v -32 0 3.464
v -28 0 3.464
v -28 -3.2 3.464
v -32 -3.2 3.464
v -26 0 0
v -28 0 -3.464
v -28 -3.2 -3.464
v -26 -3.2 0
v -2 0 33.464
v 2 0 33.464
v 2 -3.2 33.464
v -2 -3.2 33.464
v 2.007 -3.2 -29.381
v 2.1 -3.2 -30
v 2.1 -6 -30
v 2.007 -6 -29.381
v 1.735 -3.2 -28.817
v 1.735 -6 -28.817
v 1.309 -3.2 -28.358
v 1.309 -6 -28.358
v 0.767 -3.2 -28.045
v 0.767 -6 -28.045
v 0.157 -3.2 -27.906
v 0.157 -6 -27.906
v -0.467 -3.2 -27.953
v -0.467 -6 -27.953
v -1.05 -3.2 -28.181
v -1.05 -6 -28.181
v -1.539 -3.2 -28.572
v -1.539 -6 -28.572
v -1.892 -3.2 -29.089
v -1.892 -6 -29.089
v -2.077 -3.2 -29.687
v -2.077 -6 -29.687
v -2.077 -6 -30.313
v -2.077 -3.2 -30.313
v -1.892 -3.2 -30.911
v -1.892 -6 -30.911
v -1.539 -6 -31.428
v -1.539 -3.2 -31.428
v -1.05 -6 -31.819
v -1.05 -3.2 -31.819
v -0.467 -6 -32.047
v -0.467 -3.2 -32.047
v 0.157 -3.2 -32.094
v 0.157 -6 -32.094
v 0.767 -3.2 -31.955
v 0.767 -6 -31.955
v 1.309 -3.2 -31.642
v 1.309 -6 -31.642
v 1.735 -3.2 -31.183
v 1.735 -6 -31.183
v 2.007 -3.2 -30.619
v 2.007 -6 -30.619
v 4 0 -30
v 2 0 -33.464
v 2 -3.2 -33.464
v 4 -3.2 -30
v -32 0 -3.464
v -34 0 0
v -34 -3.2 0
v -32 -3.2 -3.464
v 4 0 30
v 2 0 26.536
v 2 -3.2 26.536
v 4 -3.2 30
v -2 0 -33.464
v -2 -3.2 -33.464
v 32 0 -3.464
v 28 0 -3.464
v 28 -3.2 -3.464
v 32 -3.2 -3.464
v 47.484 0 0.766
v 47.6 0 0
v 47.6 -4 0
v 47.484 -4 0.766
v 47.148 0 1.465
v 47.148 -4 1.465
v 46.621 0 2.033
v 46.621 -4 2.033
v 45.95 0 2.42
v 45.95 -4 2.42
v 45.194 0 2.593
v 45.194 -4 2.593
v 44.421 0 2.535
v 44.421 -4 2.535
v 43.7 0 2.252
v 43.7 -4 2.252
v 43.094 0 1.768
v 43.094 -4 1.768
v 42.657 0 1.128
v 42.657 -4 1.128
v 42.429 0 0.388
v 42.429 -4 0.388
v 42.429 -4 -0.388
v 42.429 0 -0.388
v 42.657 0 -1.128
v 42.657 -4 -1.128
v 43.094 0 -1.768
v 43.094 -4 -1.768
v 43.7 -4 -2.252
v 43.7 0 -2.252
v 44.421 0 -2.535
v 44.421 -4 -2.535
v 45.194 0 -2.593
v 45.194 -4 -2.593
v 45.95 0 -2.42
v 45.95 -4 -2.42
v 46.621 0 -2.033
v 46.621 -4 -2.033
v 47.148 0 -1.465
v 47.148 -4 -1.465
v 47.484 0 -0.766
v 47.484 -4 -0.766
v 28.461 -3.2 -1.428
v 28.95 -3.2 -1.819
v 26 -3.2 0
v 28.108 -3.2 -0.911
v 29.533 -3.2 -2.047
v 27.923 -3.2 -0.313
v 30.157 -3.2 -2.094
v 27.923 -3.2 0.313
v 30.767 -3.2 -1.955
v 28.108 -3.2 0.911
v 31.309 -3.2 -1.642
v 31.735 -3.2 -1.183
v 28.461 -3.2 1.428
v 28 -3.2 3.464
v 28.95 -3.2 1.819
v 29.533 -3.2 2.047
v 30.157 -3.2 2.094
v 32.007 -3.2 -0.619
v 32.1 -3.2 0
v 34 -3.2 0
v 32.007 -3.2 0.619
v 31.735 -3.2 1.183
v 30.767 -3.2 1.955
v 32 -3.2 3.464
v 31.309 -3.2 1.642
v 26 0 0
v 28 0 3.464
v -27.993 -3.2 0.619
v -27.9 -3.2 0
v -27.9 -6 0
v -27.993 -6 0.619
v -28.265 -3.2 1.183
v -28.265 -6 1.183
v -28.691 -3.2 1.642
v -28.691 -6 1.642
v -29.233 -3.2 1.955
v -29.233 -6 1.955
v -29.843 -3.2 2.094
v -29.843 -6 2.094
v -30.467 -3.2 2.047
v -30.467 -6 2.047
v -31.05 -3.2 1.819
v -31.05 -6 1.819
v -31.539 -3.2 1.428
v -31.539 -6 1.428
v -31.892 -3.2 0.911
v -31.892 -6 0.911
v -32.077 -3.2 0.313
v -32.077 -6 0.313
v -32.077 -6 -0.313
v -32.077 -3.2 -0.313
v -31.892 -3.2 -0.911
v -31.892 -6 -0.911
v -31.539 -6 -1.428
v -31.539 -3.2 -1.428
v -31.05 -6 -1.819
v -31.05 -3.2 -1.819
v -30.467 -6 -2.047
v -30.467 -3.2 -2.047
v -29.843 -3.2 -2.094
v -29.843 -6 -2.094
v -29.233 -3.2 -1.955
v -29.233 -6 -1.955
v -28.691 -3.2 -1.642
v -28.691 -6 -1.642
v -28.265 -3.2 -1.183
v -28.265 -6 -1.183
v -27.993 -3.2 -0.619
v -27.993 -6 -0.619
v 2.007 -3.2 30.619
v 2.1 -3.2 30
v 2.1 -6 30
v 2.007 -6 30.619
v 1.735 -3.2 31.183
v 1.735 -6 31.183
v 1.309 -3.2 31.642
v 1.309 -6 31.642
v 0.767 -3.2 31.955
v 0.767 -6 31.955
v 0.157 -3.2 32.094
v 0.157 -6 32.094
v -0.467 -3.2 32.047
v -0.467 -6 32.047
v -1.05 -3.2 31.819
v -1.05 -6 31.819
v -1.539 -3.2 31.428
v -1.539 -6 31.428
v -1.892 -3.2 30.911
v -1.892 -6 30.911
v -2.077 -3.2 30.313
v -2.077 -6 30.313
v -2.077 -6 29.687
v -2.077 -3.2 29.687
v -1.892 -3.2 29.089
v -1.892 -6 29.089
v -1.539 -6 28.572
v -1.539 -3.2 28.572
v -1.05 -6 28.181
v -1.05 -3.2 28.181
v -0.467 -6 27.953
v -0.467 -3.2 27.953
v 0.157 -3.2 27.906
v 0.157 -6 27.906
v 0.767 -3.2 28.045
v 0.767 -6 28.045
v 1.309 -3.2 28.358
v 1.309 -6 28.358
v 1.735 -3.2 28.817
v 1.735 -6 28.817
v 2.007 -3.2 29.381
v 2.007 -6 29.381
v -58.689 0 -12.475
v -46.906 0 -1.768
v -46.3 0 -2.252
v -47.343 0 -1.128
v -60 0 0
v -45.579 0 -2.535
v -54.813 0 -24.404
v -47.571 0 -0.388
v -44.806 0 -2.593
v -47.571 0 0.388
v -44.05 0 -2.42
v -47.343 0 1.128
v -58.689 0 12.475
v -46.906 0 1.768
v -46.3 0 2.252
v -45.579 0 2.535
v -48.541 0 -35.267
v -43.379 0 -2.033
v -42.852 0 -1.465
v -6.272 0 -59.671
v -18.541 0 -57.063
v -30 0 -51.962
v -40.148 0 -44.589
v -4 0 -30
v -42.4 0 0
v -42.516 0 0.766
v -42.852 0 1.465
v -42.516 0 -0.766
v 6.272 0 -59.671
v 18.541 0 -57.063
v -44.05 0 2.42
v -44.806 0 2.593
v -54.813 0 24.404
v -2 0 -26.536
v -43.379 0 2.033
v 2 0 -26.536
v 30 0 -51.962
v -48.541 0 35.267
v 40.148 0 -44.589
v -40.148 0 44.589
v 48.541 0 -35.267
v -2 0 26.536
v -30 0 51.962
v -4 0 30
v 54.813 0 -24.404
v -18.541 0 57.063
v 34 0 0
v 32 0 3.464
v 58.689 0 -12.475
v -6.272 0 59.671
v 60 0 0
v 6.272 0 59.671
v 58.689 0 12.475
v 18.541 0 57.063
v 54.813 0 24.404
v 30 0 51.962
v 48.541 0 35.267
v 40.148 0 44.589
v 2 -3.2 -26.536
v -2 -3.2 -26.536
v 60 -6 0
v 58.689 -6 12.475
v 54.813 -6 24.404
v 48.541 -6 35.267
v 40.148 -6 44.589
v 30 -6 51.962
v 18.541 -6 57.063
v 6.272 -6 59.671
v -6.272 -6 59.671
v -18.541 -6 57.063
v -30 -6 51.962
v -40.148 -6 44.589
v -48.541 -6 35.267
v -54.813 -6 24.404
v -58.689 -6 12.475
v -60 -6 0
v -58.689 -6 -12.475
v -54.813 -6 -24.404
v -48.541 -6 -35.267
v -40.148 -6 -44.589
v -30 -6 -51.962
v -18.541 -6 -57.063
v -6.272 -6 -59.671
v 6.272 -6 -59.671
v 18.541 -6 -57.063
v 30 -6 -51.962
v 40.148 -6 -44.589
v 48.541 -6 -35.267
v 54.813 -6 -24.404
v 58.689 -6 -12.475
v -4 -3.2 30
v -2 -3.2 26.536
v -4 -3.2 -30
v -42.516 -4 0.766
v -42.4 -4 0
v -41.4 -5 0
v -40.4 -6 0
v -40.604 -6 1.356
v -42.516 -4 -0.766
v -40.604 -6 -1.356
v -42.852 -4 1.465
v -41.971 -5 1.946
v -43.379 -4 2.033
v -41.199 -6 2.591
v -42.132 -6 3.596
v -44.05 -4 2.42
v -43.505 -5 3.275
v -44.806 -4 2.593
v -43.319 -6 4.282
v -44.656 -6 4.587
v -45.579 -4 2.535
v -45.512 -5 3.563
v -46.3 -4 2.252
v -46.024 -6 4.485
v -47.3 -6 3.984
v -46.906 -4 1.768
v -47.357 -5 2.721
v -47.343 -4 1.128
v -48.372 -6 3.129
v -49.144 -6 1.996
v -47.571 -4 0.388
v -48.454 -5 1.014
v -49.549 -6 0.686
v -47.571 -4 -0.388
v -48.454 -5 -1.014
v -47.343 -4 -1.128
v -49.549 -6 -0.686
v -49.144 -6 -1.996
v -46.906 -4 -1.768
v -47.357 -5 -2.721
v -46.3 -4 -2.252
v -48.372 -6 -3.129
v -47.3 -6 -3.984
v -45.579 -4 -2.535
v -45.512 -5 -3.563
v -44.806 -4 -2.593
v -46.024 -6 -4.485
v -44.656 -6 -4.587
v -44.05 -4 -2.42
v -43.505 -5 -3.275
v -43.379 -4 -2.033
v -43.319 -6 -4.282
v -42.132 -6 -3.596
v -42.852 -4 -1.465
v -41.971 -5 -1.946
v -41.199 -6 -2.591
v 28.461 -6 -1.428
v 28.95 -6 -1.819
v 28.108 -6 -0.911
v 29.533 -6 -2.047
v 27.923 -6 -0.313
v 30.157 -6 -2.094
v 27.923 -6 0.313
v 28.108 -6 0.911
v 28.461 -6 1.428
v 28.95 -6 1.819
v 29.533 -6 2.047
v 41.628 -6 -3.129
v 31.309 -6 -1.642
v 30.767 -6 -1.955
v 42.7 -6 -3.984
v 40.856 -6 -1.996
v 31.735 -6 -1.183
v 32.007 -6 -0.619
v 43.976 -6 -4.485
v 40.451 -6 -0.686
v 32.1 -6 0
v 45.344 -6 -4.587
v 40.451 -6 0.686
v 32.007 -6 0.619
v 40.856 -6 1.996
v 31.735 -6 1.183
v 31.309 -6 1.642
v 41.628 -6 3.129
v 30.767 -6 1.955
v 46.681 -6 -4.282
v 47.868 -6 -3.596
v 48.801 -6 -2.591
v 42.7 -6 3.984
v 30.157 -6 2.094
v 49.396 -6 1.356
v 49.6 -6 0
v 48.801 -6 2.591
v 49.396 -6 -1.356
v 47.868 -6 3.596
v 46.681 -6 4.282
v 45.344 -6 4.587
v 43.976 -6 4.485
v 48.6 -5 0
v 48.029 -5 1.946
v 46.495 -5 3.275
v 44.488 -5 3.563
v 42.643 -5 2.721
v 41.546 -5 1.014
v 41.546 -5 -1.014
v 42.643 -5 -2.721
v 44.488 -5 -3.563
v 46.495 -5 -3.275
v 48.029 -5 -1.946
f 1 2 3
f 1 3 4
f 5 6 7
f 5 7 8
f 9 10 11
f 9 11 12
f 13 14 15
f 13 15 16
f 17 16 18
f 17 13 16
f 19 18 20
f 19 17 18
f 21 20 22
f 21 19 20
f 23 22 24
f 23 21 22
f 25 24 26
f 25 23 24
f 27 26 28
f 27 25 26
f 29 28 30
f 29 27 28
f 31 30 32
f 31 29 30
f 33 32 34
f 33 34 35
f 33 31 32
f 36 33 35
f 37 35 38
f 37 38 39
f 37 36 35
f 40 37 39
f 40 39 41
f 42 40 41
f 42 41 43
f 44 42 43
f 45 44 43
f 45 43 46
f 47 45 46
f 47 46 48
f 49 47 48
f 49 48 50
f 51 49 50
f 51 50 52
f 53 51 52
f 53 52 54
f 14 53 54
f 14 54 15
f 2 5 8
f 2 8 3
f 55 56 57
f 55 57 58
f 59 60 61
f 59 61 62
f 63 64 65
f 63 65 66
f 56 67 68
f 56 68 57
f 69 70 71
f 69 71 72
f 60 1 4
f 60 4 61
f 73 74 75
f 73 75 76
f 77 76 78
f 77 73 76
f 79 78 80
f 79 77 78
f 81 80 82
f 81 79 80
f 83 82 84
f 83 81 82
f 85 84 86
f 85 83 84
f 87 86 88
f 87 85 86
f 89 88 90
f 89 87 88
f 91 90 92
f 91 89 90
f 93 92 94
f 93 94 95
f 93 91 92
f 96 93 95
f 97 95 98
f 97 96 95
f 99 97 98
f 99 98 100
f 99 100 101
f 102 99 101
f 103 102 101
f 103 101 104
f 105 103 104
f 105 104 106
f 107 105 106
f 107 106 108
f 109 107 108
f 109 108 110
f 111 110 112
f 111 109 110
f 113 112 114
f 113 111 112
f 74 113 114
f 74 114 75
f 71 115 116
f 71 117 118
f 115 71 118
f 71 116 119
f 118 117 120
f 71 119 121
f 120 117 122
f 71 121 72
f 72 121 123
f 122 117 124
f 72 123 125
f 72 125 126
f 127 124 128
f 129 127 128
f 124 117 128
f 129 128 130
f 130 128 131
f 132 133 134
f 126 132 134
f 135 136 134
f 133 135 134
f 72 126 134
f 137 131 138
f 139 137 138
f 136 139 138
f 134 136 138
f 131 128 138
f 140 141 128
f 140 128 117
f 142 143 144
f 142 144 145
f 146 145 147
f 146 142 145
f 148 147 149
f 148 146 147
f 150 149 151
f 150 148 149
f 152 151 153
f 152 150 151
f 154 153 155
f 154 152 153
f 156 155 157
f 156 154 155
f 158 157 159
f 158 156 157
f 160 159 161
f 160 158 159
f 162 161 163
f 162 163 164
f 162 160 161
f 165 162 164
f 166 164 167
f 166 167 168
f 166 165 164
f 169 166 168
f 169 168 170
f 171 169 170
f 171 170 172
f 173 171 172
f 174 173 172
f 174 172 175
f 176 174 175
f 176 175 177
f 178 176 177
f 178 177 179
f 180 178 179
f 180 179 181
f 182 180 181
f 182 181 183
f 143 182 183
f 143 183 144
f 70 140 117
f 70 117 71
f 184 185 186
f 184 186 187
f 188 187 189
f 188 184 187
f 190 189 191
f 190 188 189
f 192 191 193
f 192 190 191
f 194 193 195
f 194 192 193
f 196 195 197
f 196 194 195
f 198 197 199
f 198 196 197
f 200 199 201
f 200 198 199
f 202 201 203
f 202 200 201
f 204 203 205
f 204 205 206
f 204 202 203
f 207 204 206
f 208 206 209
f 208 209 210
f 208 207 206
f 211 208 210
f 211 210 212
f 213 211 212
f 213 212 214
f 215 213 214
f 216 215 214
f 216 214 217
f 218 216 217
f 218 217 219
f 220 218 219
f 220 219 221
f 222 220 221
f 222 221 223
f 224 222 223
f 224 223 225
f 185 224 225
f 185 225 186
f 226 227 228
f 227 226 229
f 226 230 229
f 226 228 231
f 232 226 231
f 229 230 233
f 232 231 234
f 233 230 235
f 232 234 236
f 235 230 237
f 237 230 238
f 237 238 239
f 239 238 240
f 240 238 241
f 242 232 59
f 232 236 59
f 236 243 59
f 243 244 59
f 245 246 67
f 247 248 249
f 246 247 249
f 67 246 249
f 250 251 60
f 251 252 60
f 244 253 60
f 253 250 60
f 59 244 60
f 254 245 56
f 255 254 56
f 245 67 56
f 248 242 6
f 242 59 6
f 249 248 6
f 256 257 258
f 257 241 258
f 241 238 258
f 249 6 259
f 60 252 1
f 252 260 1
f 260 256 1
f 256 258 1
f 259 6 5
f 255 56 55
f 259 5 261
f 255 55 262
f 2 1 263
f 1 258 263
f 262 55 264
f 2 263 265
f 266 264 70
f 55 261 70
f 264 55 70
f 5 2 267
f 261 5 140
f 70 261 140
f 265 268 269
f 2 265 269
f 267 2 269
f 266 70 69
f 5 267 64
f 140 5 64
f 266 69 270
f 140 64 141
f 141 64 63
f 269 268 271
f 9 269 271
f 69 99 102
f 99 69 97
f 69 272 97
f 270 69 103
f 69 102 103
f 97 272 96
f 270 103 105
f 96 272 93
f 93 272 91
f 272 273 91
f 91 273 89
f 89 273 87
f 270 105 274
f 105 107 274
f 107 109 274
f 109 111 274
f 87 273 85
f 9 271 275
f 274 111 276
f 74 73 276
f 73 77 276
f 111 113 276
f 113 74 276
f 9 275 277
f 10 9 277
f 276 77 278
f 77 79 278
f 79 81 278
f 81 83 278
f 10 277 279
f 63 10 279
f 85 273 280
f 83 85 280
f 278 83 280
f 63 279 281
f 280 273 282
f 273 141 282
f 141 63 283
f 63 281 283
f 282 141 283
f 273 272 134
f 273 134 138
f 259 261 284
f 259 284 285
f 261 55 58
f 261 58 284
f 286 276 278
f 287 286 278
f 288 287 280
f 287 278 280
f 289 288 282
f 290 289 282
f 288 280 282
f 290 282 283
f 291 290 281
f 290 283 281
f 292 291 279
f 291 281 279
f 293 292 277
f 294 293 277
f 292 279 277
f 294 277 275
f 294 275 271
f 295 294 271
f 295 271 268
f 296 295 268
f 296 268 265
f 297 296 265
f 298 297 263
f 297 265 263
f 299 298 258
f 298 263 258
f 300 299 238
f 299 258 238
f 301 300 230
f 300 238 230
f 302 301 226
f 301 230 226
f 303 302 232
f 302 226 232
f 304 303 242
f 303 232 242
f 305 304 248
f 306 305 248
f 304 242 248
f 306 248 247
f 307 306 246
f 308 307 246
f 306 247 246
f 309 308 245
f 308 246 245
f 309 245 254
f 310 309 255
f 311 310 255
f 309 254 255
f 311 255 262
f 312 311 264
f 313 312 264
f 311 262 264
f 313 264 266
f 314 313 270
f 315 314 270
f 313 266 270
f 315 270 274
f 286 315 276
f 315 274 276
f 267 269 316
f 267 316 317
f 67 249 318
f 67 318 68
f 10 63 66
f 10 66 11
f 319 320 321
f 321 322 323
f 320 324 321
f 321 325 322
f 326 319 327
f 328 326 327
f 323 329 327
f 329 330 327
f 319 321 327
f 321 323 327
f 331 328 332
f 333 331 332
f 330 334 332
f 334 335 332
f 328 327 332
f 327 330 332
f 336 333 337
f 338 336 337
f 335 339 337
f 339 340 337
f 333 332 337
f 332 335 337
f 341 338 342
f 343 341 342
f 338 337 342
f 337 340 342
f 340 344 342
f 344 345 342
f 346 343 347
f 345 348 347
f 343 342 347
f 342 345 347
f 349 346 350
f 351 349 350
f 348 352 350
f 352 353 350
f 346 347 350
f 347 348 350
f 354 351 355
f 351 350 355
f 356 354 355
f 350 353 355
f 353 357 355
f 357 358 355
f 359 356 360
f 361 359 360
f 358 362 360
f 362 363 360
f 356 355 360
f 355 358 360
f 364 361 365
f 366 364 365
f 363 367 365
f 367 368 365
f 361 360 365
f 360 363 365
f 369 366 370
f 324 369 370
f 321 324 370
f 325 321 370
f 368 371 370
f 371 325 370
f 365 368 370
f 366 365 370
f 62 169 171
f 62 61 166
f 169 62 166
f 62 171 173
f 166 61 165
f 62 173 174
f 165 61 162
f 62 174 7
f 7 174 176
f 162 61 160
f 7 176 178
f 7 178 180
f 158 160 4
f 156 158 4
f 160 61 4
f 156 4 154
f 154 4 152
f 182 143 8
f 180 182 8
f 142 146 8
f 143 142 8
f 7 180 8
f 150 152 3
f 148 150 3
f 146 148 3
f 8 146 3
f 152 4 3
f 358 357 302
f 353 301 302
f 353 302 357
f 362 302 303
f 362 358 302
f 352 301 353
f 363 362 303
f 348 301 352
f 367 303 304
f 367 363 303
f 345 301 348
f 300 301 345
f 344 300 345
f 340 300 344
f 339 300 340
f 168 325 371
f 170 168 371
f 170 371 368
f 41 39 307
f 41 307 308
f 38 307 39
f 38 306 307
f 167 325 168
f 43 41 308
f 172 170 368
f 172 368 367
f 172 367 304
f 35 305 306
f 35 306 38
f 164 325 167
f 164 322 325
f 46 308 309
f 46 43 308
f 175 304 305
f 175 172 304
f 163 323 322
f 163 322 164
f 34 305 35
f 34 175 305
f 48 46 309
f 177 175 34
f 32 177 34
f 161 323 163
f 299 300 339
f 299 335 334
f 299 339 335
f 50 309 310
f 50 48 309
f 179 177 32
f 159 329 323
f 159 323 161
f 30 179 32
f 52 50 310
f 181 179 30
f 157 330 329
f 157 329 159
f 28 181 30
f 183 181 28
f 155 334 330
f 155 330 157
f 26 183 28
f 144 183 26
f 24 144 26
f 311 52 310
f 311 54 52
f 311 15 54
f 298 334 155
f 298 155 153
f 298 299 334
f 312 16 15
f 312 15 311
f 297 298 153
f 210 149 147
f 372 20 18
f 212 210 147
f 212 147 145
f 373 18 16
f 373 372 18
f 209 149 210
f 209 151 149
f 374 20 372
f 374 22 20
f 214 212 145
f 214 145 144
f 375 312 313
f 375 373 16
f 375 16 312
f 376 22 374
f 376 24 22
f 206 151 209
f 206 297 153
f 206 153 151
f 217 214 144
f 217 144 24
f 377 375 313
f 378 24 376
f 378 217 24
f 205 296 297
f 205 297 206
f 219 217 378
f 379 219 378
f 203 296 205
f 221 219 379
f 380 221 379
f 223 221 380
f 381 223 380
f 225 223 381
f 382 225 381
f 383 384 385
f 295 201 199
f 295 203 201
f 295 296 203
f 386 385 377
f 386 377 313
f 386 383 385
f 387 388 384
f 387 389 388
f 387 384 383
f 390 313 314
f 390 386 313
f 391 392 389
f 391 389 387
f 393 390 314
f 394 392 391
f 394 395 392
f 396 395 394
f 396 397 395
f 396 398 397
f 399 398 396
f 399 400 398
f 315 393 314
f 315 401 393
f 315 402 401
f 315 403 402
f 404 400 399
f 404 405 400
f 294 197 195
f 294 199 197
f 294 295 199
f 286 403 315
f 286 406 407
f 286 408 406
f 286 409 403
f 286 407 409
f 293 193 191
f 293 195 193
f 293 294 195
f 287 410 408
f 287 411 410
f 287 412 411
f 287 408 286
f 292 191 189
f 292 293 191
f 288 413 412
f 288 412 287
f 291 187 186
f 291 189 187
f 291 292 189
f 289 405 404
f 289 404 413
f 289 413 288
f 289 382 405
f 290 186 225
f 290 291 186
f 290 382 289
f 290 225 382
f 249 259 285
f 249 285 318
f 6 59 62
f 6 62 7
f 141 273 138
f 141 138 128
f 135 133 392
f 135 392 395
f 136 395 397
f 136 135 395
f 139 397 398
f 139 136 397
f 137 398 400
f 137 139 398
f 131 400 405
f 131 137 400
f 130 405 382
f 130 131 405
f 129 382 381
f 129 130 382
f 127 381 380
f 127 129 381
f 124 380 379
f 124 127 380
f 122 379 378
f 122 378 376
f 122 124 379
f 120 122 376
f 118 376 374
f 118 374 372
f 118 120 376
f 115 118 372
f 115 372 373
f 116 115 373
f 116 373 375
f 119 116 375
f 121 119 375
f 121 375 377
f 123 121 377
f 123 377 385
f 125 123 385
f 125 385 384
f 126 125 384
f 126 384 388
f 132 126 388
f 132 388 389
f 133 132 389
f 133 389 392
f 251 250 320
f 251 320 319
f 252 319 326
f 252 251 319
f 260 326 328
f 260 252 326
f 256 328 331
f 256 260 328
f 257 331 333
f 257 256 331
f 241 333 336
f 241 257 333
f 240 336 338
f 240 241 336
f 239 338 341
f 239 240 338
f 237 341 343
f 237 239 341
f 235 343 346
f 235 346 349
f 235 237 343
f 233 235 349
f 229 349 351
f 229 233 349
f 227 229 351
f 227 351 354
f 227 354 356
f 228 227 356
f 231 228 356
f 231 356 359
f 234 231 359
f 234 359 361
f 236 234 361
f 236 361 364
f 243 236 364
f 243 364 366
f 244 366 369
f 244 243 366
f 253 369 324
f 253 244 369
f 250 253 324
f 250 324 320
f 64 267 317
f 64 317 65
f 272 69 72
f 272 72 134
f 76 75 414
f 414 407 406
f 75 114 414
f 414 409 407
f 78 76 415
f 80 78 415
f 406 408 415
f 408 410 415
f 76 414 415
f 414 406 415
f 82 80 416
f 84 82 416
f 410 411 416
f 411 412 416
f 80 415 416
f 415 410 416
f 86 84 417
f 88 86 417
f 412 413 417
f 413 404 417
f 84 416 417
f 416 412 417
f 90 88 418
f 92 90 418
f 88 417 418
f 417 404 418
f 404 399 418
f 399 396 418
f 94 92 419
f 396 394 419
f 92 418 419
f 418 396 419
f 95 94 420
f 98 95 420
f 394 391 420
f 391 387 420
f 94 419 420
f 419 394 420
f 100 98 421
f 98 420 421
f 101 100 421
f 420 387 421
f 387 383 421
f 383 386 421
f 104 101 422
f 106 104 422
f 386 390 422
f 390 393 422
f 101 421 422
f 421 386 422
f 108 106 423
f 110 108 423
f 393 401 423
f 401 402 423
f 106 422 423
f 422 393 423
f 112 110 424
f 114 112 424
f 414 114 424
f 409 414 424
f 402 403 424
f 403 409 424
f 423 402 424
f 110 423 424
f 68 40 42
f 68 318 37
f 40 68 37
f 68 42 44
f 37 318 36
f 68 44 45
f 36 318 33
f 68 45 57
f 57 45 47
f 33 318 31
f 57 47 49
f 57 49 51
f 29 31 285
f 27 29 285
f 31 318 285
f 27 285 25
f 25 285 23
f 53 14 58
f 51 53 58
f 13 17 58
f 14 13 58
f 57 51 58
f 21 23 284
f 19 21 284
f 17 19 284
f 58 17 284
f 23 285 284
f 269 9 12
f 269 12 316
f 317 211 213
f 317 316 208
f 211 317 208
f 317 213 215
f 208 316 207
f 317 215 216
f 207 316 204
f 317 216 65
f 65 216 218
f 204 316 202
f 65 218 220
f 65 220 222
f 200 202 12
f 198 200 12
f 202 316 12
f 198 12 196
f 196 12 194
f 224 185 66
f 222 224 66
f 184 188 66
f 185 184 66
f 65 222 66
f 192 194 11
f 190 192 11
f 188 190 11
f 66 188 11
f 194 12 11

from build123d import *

# Parameters (mm, degrees)
SKETCH_R     = 60
SKETCH_R_2   = 2.6
SKETCH_R_3   = 2.1
PAD_DEPTH    = 6
CHAMFER_SIZE = 2
POCKET_DEPTH = 3.2


with BuildPart() as part:
    # Sketch → Pad (new body)
    with BuildSketch(Plane.XZ):
        Circle(SKETCH_R)
        with Locations((-45, 0)):
            Circle(SKETCH_R_2, mode=Mode.SUBTRACT)
        with Locations((45, 0)):
            Circle(SKETCH_R_2, mode=Mode.SUBTRACT)
        with Locations((-30, 0)):
            Circle(SKETCH_R_3, mode=Mode.SUBTRACT)
        with Locations((30, 0)):
            Circle(SKETCH_R_3, mode=Mode.SUBTRACT)
        with Locations((0, 30)):
            Circle(SKETCH_R_3, mode=Mode.SUBTRACT)
        with Locations((0, -30)):
            Circle(SKETCH_R_3, mode=Mode.SUBTRACT)
    extrude(amount=PAD_DEPTH)

    # Chamfer
    chamfer_edges = [part.edges().sort_by_distance(p)[0] for p in [
        (-47.6, -6, 0),
        (42.4, -6, 0),
    ]]
    chamfer(chamfer_edges, length=CHAMFER_SIZE)

    # Sketch001 → Pocket (cut)
    with BuildSketch(Plane.XZ):
        Polygon((2, 33.464102), (-2, 33.464102), (-4, 30), (-2, 26.535898), (2, 26.535898), (4, 30), align=None)
        Polygon((32, 3.464102), (28, 3.464102), (26, 0), (28, -3.464102), (32, -3.464102), (34, 0), align=None)
        Polygon((2, -26.535898), (-2, -26.535898), (-4, -30), (-2, -33.464102), (2, -33.464102), (4, -30), align=None)
        Polygon((-32, 3.464102), (-34, 0), (-32, -3.464102), (-28, -3.464102), (-26, 0), (-28, 3.464102), align=None)
    extrude(amount=POCKET_DEPTH, mode=Mode.SUBTRACT)


solid = part.part
